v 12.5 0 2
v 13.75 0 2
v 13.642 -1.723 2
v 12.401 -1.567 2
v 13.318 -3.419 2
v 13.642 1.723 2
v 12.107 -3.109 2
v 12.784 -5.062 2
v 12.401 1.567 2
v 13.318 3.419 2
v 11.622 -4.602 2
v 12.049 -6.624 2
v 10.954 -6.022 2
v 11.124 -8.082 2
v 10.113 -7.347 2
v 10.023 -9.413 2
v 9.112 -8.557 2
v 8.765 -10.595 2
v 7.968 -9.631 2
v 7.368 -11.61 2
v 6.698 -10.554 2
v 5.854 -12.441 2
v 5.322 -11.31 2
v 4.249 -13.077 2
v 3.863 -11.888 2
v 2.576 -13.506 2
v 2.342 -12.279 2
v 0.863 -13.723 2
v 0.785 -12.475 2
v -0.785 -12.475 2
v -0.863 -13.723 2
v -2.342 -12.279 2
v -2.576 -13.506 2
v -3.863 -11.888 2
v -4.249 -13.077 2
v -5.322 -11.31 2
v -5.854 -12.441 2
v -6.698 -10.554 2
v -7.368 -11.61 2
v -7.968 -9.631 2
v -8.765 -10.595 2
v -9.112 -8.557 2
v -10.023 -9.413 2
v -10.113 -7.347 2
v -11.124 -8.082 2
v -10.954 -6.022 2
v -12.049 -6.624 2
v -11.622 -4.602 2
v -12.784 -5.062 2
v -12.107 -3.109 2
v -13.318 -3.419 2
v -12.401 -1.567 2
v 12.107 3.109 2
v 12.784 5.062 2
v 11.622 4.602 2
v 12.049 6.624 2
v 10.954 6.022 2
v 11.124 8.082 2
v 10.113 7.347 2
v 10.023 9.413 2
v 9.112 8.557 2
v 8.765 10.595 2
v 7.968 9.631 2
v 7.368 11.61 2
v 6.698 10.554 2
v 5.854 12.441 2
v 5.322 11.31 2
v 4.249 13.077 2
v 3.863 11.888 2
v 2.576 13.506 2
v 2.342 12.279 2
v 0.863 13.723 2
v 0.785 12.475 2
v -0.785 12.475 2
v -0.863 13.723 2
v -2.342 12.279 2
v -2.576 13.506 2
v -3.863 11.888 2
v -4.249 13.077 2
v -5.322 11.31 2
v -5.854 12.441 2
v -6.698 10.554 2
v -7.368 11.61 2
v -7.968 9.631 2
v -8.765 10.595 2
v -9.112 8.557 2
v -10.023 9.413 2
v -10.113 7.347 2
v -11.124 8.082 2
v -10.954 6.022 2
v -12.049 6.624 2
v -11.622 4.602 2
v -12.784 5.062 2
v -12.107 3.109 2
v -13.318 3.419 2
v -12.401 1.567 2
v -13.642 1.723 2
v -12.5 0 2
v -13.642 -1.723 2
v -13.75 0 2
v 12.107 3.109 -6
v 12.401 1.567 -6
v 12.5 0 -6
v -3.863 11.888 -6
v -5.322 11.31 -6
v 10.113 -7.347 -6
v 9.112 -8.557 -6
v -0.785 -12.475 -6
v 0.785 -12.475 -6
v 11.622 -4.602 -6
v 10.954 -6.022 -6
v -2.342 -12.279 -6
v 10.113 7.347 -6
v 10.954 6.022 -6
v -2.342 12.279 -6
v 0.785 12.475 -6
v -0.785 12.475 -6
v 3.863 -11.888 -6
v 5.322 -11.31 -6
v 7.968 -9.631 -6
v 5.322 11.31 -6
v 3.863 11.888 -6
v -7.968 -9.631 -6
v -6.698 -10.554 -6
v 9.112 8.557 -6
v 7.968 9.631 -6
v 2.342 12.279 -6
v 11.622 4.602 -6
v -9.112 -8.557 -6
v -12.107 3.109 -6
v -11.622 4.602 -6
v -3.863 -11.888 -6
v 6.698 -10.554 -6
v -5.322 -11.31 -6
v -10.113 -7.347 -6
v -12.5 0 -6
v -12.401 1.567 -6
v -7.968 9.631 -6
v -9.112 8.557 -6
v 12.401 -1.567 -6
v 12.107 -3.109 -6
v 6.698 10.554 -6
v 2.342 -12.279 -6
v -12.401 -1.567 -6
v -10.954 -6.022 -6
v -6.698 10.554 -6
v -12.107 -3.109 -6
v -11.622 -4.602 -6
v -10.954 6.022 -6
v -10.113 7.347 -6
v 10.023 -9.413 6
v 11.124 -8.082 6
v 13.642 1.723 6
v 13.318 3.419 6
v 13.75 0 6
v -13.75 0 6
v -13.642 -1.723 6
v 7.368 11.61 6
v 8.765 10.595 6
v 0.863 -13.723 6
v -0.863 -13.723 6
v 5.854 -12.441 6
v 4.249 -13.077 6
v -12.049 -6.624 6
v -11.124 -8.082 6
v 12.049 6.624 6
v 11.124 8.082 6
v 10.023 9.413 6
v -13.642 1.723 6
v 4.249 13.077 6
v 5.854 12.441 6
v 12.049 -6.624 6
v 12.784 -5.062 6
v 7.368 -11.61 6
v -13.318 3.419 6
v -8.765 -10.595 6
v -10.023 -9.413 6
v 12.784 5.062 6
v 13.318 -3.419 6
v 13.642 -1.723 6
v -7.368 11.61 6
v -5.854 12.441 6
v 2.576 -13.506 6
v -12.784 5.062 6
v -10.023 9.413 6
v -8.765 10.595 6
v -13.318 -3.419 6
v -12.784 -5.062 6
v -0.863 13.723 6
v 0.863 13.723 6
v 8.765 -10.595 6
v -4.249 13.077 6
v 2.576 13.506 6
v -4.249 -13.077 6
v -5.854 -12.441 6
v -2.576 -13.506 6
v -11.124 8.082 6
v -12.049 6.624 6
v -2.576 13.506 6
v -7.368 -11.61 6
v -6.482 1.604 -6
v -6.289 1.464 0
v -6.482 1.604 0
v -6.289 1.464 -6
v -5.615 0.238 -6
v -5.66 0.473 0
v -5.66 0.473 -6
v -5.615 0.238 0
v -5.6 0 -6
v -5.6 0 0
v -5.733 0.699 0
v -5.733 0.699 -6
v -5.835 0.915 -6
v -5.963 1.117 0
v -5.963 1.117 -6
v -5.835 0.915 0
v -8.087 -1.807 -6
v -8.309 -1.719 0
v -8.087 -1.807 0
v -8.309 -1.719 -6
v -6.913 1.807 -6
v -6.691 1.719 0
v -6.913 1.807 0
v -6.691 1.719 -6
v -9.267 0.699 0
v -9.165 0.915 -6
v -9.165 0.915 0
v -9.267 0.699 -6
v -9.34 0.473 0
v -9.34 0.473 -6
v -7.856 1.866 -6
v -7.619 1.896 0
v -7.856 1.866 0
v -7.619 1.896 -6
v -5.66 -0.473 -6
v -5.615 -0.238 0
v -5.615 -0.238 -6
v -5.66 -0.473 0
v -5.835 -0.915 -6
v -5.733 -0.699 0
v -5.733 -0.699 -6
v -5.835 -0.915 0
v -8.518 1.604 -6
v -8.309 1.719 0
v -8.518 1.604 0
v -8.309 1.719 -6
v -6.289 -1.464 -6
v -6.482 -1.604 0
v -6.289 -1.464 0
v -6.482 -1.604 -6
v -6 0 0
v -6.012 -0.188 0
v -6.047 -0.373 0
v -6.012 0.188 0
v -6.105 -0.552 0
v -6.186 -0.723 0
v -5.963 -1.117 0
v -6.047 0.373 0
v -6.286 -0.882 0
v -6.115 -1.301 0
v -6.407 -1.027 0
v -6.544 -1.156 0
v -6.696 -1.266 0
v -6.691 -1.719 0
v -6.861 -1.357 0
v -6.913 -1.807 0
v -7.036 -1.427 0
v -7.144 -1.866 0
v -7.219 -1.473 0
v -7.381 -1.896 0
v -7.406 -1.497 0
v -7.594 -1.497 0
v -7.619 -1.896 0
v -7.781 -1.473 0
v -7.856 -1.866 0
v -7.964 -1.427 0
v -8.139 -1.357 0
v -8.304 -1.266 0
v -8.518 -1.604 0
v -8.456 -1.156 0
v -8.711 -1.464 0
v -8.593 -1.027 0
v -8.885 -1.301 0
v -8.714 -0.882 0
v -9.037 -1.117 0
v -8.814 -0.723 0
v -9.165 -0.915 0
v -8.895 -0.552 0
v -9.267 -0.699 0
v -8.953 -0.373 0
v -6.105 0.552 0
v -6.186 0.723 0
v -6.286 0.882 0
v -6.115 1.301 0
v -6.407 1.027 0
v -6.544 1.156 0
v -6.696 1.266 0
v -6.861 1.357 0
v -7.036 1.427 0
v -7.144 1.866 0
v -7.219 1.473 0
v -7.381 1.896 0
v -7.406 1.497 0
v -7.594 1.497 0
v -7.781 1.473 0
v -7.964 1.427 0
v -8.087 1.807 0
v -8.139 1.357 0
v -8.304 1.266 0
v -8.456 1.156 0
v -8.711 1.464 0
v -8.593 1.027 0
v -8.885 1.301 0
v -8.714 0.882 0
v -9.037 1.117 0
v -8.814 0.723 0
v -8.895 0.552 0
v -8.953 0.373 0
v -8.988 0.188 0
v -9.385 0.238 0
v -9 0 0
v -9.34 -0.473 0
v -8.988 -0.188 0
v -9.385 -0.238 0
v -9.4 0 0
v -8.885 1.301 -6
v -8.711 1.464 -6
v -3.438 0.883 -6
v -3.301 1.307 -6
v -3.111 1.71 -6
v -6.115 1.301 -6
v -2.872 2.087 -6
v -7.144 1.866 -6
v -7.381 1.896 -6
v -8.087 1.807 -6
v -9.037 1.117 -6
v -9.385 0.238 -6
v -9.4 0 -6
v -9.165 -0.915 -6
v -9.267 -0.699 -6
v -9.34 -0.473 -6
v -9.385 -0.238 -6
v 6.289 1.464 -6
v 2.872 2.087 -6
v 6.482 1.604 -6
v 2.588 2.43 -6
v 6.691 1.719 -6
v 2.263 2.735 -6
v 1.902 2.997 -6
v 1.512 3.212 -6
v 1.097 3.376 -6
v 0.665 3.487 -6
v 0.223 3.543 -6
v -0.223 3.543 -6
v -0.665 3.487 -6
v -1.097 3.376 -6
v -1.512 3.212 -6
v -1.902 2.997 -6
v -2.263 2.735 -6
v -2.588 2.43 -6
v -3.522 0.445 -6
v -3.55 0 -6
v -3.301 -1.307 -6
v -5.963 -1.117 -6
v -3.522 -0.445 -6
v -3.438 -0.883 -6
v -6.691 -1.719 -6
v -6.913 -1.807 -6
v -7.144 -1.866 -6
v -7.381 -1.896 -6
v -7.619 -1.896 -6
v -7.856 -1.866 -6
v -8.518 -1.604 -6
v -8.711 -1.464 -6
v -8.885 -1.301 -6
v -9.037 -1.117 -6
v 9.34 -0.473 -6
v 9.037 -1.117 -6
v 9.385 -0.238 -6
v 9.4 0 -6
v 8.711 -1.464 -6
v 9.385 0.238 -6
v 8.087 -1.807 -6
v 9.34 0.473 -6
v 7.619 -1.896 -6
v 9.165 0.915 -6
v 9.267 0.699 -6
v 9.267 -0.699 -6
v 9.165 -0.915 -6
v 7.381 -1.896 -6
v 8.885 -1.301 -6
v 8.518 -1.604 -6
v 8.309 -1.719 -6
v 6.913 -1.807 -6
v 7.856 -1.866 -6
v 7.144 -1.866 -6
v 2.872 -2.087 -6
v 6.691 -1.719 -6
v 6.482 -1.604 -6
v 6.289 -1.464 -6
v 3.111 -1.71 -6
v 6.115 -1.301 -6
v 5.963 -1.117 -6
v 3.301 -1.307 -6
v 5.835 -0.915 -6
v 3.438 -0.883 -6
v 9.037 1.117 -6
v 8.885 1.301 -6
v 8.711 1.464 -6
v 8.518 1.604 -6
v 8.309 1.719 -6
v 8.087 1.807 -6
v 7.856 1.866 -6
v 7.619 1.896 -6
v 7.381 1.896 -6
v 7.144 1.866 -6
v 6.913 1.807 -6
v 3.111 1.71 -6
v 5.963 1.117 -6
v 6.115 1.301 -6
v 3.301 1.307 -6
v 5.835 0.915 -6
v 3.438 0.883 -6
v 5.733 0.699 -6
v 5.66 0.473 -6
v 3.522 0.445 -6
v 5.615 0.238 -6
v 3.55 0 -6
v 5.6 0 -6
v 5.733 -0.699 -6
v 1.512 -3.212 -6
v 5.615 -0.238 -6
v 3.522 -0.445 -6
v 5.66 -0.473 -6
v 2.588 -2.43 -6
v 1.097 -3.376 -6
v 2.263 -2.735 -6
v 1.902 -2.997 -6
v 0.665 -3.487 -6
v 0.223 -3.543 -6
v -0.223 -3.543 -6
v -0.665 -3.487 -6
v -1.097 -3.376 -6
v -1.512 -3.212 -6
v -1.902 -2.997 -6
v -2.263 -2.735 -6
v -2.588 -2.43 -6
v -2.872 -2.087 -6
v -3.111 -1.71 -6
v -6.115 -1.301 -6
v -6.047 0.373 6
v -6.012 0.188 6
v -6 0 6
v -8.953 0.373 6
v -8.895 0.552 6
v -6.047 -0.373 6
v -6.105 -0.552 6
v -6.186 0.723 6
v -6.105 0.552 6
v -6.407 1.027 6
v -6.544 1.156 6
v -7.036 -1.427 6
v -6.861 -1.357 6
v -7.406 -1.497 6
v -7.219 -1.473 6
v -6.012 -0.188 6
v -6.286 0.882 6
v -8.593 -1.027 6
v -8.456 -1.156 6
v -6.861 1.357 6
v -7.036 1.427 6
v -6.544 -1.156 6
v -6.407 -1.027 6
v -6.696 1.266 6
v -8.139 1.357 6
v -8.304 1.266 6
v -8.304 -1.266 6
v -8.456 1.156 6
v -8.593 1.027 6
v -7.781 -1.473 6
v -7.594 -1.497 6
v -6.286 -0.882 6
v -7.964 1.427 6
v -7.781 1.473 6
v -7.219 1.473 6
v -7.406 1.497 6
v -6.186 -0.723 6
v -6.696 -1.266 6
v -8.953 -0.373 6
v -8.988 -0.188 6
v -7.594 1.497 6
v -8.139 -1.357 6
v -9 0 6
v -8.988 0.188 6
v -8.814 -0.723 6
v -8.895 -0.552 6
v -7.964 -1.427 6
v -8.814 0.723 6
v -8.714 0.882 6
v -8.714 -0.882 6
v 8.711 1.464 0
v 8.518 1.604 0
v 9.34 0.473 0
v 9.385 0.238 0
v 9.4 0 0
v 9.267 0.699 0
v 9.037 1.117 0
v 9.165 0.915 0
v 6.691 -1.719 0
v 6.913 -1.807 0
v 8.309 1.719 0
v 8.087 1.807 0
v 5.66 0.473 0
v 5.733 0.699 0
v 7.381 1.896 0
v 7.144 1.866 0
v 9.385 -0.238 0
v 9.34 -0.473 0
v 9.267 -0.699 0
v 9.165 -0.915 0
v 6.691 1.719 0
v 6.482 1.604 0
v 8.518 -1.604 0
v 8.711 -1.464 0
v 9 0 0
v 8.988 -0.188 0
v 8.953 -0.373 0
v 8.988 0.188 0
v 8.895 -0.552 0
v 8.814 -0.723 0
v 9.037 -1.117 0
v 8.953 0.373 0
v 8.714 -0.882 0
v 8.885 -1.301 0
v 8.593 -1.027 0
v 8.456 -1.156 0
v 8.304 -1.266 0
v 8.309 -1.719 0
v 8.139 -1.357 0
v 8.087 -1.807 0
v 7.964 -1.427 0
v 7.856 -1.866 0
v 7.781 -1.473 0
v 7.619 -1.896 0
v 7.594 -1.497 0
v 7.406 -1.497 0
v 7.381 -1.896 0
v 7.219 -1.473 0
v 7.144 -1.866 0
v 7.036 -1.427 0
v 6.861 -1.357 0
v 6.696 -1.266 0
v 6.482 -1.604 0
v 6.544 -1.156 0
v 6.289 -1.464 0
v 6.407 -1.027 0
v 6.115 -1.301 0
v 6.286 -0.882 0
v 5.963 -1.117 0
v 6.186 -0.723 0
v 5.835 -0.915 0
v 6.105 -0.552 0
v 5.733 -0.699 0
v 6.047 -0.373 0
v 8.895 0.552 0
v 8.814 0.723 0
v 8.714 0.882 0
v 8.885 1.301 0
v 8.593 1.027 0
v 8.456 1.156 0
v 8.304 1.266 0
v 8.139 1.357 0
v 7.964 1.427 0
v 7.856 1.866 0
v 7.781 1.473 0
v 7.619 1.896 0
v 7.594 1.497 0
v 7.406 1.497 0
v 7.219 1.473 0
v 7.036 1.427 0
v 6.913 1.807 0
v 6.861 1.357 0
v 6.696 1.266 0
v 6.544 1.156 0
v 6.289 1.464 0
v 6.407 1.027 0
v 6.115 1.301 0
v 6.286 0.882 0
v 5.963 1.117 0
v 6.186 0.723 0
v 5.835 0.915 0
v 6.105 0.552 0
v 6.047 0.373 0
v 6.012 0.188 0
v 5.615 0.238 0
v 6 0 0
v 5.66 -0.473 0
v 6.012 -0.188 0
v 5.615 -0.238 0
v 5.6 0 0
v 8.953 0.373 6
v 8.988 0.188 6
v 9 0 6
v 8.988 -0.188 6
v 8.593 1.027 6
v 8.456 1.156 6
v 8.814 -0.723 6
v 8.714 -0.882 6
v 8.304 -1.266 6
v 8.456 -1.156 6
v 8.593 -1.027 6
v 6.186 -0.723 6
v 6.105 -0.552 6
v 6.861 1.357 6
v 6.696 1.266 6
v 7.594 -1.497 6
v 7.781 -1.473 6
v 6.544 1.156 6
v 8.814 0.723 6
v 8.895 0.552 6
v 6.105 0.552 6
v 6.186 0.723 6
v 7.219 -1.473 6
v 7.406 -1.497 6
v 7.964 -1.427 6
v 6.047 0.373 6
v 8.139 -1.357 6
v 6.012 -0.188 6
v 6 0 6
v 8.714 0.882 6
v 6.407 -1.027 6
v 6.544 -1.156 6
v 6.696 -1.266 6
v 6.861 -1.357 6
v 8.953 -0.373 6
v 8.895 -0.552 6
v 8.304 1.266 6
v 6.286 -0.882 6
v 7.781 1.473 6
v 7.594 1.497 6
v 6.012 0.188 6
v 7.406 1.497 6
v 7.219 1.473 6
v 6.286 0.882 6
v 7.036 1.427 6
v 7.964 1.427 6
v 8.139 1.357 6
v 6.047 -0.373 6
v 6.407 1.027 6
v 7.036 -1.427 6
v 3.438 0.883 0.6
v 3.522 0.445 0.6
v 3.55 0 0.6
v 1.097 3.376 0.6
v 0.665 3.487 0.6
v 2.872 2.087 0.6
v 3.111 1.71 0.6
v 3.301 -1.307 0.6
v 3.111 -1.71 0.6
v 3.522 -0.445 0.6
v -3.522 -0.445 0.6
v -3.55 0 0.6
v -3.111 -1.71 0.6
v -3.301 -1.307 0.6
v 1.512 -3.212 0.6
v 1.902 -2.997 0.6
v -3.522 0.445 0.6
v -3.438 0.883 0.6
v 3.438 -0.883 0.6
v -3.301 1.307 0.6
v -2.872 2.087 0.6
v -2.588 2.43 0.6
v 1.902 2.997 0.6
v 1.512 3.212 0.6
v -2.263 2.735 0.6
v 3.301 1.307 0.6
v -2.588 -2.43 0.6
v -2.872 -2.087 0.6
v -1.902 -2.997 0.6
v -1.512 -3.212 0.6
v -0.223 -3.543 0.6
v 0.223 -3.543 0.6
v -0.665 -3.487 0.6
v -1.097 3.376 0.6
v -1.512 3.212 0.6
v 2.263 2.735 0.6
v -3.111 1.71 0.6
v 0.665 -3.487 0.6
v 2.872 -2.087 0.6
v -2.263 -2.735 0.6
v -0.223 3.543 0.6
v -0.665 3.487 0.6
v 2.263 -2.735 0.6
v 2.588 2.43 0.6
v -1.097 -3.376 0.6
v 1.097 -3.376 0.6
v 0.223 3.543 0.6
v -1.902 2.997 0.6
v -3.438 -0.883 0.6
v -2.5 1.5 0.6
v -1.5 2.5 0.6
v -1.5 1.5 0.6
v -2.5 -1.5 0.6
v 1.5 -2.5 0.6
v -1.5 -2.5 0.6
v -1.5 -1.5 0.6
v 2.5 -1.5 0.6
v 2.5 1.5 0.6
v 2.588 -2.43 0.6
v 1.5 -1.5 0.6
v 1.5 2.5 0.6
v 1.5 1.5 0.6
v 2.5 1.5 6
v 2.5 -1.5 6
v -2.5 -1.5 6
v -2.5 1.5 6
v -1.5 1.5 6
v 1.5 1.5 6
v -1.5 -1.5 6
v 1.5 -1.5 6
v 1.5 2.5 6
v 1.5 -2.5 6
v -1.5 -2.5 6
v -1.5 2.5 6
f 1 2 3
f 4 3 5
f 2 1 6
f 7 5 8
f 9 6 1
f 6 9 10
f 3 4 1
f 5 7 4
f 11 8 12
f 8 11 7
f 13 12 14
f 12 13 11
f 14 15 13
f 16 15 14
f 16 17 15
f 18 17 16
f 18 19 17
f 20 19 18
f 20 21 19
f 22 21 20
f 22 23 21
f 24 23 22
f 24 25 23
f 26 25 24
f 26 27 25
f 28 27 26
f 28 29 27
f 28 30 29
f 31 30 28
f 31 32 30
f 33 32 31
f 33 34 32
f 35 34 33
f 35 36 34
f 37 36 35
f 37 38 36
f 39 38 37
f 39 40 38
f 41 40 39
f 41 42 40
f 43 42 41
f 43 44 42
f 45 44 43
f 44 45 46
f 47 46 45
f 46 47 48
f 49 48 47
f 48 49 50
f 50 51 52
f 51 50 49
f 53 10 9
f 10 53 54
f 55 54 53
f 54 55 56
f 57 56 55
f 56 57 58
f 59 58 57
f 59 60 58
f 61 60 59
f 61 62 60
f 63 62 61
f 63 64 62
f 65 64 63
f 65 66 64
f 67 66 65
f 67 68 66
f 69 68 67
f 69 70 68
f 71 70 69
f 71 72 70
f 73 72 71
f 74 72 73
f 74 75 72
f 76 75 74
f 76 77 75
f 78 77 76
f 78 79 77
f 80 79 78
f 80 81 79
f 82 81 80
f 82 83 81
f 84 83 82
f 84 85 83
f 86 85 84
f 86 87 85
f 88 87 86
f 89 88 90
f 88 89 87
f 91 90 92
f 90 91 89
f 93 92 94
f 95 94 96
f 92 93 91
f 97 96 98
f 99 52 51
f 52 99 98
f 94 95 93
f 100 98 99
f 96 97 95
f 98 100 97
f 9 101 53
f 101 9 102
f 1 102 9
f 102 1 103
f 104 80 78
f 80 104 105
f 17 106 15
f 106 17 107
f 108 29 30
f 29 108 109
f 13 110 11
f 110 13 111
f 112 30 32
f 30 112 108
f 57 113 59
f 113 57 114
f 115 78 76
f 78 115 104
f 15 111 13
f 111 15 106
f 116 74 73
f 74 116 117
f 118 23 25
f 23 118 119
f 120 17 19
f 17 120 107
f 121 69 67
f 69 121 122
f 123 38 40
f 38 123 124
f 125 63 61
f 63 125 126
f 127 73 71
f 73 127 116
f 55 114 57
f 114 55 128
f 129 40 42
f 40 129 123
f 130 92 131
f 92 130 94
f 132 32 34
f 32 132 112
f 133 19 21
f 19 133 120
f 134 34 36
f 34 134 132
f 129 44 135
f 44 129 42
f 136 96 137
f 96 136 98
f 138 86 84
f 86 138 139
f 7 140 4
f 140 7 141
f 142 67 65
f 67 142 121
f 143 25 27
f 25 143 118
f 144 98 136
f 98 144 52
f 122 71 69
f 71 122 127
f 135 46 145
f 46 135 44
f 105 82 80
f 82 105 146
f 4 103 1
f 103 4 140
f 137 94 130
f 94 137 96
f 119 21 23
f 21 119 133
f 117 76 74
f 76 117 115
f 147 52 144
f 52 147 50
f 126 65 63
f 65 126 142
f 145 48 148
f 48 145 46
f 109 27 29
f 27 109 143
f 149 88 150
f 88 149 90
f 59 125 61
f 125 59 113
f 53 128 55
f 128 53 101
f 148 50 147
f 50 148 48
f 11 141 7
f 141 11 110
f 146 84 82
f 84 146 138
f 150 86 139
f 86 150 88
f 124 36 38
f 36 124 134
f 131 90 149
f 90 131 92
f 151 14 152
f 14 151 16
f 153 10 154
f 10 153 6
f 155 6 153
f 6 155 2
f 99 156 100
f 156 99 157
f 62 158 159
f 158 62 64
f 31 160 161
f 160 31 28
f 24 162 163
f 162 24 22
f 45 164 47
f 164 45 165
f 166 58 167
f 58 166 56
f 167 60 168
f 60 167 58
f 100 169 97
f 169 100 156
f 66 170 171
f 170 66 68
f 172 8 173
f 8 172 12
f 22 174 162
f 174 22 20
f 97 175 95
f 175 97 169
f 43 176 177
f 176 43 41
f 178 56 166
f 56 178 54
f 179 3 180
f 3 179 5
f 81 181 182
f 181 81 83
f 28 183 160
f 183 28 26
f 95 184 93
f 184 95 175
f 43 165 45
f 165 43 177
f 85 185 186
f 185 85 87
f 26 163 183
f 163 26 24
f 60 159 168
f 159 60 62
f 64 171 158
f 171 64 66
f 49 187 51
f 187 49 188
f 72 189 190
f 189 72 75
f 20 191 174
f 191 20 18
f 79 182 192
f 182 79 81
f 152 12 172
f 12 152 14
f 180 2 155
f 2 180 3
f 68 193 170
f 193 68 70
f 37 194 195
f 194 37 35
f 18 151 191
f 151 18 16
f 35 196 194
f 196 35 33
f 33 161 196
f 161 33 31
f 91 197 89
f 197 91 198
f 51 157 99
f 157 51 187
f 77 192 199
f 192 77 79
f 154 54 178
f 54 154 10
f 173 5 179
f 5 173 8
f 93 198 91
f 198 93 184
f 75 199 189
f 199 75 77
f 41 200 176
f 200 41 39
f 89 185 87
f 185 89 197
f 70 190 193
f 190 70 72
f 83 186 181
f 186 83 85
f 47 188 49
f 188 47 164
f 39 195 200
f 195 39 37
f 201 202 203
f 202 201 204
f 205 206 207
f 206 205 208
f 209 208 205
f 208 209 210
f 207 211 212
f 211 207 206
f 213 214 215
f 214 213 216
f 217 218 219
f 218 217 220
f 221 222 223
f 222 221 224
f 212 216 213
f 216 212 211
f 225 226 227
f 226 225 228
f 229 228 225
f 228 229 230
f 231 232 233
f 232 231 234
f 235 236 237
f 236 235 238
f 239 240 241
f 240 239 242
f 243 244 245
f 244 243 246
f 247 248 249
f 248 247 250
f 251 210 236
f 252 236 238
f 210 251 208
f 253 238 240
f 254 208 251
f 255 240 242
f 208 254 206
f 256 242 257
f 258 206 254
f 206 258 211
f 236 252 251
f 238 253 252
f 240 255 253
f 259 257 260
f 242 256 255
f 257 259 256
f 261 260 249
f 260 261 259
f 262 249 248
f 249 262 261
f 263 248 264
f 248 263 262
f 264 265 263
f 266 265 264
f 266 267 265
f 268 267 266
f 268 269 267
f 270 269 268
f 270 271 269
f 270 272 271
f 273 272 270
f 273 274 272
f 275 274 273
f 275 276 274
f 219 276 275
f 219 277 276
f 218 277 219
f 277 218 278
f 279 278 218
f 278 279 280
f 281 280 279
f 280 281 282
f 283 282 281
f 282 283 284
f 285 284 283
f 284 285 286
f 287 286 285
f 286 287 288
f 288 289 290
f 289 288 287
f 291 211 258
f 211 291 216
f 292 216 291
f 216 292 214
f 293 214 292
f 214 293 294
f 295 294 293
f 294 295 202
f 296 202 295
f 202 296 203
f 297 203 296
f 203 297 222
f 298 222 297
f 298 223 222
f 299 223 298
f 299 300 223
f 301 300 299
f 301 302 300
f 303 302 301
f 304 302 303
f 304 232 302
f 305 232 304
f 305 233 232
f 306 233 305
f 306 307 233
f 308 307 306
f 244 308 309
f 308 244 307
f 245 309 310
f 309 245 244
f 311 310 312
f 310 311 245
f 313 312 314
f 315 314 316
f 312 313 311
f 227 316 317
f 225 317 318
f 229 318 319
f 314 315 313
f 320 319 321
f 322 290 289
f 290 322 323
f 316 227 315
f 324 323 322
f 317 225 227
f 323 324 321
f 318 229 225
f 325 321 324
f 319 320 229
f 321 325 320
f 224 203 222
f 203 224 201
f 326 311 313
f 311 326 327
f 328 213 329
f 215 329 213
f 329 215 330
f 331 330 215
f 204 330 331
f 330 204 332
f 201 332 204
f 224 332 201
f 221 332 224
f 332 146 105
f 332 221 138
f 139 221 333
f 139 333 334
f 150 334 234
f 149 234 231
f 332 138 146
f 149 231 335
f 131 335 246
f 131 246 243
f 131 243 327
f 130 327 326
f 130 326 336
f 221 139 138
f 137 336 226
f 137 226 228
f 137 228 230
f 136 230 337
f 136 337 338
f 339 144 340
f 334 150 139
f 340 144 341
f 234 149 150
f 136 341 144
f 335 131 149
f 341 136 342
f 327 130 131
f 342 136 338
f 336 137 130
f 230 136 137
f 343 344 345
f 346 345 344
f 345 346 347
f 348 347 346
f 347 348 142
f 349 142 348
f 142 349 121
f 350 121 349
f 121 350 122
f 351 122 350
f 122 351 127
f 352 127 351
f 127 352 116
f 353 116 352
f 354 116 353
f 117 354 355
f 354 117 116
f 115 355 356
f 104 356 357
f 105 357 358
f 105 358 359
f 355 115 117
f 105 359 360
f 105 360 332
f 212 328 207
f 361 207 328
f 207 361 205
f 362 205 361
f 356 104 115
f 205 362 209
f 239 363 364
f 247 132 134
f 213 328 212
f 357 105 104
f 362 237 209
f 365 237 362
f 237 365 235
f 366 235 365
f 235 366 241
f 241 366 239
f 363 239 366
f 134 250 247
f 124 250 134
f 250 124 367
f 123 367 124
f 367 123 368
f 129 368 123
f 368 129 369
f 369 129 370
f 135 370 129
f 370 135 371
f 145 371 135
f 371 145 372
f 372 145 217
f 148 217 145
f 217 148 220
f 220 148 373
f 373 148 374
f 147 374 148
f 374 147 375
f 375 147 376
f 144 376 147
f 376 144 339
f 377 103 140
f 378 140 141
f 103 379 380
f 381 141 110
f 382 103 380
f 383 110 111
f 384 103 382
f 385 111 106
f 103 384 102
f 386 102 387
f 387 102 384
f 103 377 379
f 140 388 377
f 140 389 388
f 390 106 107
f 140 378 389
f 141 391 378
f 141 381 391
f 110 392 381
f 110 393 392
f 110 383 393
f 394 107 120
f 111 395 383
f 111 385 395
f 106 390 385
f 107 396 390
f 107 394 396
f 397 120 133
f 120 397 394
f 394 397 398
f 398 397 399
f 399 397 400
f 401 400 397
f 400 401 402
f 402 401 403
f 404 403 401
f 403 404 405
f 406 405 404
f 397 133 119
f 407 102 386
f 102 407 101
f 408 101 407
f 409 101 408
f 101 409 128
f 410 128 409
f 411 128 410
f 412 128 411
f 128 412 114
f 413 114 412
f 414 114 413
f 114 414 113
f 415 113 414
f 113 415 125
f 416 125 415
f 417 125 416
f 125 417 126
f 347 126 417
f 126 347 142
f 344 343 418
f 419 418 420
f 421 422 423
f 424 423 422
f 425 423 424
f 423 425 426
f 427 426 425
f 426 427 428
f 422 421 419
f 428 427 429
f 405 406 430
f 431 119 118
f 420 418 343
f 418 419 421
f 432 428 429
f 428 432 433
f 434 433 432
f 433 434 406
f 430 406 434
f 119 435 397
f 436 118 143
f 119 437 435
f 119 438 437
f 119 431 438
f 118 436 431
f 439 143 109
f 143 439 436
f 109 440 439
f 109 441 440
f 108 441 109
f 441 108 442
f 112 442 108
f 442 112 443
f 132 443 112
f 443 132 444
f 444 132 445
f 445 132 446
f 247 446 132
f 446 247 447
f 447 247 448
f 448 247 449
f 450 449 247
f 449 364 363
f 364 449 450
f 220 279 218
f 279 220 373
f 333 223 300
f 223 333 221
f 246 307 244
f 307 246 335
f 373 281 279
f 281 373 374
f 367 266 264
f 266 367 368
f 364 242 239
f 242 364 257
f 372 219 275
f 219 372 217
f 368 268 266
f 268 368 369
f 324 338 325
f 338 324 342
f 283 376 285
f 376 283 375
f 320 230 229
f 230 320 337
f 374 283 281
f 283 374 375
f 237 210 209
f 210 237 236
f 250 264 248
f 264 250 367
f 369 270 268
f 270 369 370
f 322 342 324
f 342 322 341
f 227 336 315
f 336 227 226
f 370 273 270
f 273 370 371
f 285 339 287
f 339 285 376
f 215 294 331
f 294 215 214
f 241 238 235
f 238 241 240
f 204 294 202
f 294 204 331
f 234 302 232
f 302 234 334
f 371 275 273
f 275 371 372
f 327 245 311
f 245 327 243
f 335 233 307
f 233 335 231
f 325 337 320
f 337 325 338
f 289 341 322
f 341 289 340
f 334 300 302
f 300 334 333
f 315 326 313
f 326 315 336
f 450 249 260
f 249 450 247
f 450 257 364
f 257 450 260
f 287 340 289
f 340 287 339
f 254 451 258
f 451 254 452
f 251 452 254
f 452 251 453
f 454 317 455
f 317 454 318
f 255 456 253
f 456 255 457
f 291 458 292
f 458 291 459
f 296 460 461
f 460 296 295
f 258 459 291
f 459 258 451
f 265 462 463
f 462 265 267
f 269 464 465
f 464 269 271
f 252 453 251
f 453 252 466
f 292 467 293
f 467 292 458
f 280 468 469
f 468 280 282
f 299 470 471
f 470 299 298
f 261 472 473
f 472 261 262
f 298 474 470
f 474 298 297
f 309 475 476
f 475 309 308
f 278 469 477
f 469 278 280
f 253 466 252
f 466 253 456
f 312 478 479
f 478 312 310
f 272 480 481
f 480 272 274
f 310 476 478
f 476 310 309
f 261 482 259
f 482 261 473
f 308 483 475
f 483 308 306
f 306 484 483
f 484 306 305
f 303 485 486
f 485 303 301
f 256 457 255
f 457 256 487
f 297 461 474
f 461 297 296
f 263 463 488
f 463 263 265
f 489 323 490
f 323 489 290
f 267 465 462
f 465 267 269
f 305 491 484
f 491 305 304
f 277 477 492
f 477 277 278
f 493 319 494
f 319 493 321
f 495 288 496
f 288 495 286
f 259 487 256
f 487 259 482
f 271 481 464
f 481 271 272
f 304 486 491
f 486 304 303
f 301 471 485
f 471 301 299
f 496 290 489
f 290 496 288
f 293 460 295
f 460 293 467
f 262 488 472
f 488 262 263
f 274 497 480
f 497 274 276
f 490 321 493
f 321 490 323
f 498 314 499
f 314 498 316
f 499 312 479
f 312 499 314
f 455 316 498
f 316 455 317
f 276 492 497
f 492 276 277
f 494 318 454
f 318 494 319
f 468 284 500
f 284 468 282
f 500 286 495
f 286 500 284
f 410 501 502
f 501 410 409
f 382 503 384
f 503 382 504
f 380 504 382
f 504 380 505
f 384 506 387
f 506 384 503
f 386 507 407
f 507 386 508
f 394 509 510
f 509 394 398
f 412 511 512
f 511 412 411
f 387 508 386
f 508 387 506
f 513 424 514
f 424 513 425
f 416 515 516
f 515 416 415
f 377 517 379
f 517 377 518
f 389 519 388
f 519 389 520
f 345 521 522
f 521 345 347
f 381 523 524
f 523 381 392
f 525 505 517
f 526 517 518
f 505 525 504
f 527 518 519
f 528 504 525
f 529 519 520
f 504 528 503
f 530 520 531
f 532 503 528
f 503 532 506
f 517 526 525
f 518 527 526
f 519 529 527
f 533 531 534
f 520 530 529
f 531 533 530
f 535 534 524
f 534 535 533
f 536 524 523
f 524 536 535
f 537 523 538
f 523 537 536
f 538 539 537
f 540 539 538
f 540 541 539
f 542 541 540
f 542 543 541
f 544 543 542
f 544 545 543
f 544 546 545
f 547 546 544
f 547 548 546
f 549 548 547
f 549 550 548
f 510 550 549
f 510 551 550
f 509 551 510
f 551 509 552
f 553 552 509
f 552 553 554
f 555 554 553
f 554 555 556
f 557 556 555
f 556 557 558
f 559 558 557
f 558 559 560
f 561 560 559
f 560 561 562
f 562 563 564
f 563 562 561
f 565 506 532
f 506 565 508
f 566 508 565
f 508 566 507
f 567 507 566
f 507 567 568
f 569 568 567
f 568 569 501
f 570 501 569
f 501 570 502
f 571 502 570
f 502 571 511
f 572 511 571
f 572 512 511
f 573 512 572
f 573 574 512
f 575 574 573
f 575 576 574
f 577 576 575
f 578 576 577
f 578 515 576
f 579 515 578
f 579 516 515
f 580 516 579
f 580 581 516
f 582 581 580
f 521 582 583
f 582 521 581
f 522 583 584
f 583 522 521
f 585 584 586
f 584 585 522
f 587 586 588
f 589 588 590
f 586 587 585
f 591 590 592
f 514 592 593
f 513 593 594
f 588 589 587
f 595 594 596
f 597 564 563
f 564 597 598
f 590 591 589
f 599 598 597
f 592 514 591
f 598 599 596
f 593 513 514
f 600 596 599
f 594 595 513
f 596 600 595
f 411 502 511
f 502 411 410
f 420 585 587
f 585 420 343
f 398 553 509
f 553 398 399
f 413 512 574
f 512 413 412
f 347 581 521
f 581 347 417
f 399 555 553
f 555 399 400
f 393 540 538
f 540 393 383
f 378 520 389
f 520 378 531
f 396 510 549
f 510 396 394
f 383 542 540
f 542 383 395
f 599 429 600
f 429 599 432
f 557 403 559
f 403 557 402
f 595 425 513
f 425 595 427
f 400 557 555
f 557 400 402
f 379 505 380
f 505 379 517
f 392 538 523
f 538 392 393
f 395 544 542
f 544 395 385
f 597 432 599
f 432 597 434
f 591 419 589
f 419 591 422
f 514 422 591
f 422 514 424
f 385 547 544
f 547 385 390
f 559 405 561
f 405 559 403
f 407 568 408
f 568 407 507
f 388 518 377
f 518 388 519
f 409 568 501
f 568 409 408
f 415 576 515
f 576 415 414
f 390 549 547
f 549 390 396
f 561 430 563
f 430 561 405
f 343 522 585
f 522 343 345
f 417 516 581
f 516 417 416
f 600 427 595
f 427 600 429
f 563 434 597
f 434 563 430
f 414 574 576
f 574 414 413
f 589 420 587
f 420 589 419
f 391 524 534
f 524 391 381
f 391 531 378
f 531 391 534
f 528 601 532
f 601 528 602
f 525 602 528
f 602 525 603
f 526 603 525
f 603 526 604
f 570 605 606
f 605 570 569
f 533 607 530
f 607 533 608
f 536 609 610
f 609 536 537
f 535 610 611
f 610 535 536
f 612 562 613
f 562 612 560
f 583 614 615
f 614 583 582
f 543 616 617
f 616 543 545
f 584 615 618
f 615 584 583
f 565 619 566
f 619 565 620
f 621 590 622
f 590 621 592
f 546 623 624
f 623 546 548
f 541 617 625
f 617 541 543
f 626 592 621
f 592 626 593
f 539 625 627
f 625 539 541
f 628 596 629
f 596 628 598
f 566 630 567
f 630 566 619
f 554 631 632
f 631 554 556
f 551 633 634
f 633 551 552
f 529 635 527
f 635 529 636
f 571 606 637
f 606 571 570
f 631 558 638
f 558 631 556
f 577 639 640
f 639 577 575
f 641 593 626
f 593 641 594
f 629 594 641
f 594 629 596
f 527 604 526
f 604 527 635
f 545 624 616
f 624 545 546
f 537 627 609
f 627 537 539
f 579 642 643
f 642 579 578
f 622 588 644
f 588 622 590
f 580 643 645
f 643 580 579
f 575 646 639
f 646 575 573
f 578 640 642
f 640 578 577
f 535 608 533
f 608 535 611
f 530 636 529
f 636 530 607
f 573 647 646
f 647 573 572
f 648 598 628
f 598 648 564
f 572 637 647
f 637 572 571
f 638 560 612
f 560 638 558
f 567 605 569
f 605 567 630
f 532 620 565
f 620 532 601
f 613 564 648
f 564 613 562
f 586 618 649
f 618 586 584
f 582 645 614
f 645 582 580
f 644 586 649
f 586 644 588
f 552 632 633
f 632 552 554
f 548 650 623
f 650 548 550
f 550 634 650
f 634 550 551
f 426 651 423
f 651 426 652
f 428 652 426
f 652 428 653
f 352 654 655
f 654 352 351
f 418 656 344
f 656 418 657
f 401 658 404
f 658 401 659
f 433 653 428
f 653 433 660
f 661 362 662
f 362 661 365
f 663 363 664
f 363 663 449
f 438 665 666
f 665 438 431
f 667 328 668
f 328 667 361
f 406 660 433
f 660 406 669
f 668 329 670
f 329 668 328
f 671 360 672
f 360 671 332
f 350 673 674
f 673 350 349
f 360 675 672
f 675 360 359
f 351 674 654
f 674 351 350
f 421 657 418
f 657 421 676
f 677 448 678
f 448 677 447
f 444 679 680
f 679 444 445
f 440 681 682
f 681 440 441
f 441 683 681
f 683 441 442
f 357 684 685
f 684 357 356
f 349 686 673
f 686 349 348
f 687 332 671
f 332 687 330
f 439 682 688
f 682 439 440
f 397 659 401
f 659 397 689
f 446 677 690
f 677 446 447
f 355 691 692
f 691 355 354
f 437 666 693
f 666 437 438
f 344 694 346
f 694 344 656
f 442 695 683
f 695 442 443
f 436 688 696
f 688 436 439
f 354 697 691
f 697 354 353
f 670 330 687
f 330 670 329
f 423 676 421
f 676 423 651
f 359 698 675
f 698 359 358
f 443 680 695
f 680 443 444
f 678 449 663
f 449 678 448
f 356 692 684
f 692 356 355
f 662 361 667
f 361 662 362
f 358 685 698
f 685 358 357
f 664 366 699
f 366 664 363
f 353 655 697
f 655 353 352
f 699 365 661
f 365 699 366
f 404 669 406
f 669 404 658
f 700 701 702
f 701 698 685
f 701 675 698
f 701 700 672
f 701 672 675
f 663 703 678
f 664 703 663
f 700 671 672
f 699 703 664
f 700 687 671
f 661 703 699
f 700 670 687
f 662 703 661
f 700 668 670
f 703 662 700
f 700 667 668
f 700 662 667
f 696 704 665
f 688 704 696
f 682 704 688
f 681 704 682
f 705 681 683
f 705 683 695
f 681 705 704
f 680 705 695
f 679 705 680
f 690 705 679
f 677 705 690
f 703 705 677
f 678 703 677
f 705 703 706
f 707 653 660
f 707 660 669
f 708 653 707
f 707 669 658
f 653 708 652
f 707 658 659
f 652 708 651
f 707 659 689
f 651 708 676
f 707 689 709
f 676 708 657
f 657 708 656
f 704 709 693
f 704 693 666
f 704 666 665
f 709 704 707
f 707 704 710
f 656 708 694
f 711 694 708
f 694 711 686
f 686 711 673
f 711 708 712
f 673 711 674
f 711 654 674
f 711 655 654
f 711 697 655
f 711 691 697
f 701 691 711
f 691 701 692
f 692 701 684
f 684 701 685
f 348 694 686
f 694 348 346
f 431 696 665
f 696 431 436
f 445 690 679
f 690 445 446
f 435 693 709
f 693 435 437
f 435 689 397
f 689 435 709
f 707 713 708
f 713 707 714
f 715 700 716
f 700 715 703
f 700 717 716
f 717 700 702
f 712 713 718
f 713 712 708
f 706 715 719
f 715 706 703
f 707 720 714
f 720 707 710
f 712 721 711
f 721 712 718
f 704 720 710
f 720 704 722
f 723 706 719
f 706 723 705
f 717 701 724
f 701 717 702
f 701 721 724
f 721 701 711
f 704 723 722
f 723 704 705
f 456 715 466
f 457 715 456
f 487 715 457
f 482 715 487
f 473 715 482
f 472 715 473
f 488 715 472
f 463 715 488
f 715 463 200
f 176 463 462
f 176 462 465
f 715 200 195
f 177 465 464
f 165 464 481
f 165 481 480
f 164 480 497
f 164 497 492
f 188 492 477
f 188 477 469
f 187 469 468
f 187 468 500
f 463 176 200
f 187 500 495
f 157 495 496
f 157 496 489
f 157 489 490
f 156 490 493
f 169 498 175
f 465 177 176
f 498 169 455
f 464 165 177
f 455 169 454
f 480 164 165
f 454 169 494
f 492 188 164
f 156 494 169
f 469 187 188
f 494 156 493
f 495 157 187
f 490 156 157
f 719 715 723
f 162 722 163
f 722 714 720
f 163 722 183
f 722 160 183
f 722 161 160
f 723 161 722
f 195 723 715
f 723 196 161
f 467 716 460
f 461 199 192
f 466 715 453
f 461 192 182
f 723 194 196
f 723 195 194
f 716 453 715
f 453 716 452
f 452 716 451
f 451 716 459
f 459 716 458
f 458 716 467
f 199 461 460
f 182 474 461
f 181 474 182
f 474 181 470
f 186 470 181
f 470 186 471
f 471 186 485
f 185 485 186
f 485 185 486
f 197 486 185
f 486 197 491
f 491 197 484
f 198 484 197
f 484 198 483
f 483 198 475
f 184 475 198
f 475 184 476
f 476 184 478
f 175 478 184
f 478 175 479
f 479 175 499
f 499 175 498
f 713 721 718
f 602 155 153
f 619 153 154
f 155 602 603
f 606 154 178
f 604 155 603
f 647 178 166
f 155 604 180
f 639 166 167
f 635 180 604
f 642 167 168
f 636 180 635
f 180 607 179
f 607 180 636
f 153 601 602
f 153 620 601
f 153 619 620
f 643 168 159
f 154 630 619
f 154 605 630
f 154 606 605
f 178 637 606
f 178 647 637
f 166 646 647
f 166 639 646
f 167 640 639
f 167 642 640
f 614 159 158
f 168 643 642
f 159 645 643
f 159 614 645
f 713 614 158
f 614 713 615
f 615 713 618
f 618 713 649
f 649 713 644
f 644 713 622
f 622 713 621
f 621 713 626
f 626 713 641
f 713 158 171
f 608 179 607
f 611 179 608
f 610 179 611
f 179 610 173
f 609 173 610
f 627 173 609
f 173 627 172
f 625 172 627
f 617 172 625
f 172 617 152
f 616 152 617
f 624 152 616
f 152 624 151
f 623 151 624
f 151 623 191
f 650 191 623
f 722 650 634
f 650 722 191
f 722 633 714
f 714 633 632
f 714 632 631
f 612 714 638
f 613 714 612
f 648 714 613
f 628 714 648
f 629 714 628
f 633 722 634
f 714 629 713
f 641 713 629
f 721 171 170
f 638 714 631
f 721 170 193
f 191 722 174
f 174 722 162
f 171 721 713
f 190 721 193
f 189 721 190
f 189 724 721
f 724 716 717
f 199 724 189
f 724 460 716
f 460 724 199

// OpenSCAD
$fn = 50;

difference() {
	union() {
		translate(v = [0, 0, 0]) {
			rotate(a = [0, 0, 0]) {
				difference() {
					union() {
						translate(v = [0, 0, -6.0]) {
							cylinder(h = 12, r = 14.5);
						}
					}
					union() {
						translate(v = [0, 0, 0]) {
							rotate(a = [0, 0, 0]) {
								difference() {
									union() {
										translate(v = [0, 0, -2.0]) {
											cylinder(h = 4, r = 16.0);
										}
									}
									union() {
										translate(v = [0, 0, -2.01]) {
											cylinder(h = 4.02, r = 12.5);
										}
									}
								}
							}
						}
						translate(v = [0, 0, -3]) {
							rotate(a = [0, 0, 0]) {
								difference() {
									union() {
										translate(v = [0, 0, -2.0]) {
											cylinder(h = 4, r = 16.0);
										}
									}
									union() {
										translate(v = [0, 0, -2.01]) {
											cylinder(h = 4.02, r = 12.5);
										}
									}
								}
							}
						}
						translate(v = [0, 0, -6]) {
							rotate(a = [0, 0, 0]) {
								difference() {
									union() {
										translate(v = [0, 0, -2.0]) {
											cylinder(h = 4, r = 16.0);
										}
									}
									union() {
										translate(v = [0, 0, -2.01]) {
											cylinder(h = 4.02, r = 12.5);
										}
									}
								}
							}
						}
						translate(v = [0, 0, 0]) {
							rotate(a = [0, 0, 0]) {
								difference() {
									union() {
										translate(v = [0, 0, -21.0]) {
											cylinder(h = 42, r = 14.75);
										}
									}
									union() {
										translate(v = [0, 0, -21.01]) {
											cylinder(h = 42.02, r = 13.75);
										}
									}
								}
							}
						}
						translate(v = [-15.0, -15.0, -100.0]) {
							cylinder(h = 200, r = 3.0);
						}
						translate(v = [-15.0, 15.0, -100.0]) {
							cylinder(h = 200, r = 3.0);
						}
						translate(v = [15.0, -15.0, -100.0]) {
							cylinder(h = 200, r = 3.0);
						}
						translate(v = [15.0, 15.0, -100.0]) {
							cylinder(h = 200, r = 3.0);
						}
						translate(v = [-7.5, 0, -6.0]) {
							cylinder(h = 6, r = 1.9);
						}
						translate(v = [-7.5, 0, -7.0]) {
							cylinder(h = 14, r = 1.5);
						}
						translate(v = [7.5, 0, -6.0]) {
							cylinder(h = 6, r = 1.9);
						}
						translate(v = [7.5, 0, -7.0]) {
							cylinder(h = 14, r = 1.5);
						}
						translate(v = [0, 0, -6.000000000000001]) {
							cylinder(h = 6.6, r = 3.55);
						}
						translate(v = [-2.5, -1.5, -7.0]) {
							cube(size = [5, 3, 14]);
						}
						translate(v = [-1.5, -2.5, -7.0]) {
							cube(size = [3, 5, 14]);
						}
					}
				}
			}
		}
	}
	union();
}
